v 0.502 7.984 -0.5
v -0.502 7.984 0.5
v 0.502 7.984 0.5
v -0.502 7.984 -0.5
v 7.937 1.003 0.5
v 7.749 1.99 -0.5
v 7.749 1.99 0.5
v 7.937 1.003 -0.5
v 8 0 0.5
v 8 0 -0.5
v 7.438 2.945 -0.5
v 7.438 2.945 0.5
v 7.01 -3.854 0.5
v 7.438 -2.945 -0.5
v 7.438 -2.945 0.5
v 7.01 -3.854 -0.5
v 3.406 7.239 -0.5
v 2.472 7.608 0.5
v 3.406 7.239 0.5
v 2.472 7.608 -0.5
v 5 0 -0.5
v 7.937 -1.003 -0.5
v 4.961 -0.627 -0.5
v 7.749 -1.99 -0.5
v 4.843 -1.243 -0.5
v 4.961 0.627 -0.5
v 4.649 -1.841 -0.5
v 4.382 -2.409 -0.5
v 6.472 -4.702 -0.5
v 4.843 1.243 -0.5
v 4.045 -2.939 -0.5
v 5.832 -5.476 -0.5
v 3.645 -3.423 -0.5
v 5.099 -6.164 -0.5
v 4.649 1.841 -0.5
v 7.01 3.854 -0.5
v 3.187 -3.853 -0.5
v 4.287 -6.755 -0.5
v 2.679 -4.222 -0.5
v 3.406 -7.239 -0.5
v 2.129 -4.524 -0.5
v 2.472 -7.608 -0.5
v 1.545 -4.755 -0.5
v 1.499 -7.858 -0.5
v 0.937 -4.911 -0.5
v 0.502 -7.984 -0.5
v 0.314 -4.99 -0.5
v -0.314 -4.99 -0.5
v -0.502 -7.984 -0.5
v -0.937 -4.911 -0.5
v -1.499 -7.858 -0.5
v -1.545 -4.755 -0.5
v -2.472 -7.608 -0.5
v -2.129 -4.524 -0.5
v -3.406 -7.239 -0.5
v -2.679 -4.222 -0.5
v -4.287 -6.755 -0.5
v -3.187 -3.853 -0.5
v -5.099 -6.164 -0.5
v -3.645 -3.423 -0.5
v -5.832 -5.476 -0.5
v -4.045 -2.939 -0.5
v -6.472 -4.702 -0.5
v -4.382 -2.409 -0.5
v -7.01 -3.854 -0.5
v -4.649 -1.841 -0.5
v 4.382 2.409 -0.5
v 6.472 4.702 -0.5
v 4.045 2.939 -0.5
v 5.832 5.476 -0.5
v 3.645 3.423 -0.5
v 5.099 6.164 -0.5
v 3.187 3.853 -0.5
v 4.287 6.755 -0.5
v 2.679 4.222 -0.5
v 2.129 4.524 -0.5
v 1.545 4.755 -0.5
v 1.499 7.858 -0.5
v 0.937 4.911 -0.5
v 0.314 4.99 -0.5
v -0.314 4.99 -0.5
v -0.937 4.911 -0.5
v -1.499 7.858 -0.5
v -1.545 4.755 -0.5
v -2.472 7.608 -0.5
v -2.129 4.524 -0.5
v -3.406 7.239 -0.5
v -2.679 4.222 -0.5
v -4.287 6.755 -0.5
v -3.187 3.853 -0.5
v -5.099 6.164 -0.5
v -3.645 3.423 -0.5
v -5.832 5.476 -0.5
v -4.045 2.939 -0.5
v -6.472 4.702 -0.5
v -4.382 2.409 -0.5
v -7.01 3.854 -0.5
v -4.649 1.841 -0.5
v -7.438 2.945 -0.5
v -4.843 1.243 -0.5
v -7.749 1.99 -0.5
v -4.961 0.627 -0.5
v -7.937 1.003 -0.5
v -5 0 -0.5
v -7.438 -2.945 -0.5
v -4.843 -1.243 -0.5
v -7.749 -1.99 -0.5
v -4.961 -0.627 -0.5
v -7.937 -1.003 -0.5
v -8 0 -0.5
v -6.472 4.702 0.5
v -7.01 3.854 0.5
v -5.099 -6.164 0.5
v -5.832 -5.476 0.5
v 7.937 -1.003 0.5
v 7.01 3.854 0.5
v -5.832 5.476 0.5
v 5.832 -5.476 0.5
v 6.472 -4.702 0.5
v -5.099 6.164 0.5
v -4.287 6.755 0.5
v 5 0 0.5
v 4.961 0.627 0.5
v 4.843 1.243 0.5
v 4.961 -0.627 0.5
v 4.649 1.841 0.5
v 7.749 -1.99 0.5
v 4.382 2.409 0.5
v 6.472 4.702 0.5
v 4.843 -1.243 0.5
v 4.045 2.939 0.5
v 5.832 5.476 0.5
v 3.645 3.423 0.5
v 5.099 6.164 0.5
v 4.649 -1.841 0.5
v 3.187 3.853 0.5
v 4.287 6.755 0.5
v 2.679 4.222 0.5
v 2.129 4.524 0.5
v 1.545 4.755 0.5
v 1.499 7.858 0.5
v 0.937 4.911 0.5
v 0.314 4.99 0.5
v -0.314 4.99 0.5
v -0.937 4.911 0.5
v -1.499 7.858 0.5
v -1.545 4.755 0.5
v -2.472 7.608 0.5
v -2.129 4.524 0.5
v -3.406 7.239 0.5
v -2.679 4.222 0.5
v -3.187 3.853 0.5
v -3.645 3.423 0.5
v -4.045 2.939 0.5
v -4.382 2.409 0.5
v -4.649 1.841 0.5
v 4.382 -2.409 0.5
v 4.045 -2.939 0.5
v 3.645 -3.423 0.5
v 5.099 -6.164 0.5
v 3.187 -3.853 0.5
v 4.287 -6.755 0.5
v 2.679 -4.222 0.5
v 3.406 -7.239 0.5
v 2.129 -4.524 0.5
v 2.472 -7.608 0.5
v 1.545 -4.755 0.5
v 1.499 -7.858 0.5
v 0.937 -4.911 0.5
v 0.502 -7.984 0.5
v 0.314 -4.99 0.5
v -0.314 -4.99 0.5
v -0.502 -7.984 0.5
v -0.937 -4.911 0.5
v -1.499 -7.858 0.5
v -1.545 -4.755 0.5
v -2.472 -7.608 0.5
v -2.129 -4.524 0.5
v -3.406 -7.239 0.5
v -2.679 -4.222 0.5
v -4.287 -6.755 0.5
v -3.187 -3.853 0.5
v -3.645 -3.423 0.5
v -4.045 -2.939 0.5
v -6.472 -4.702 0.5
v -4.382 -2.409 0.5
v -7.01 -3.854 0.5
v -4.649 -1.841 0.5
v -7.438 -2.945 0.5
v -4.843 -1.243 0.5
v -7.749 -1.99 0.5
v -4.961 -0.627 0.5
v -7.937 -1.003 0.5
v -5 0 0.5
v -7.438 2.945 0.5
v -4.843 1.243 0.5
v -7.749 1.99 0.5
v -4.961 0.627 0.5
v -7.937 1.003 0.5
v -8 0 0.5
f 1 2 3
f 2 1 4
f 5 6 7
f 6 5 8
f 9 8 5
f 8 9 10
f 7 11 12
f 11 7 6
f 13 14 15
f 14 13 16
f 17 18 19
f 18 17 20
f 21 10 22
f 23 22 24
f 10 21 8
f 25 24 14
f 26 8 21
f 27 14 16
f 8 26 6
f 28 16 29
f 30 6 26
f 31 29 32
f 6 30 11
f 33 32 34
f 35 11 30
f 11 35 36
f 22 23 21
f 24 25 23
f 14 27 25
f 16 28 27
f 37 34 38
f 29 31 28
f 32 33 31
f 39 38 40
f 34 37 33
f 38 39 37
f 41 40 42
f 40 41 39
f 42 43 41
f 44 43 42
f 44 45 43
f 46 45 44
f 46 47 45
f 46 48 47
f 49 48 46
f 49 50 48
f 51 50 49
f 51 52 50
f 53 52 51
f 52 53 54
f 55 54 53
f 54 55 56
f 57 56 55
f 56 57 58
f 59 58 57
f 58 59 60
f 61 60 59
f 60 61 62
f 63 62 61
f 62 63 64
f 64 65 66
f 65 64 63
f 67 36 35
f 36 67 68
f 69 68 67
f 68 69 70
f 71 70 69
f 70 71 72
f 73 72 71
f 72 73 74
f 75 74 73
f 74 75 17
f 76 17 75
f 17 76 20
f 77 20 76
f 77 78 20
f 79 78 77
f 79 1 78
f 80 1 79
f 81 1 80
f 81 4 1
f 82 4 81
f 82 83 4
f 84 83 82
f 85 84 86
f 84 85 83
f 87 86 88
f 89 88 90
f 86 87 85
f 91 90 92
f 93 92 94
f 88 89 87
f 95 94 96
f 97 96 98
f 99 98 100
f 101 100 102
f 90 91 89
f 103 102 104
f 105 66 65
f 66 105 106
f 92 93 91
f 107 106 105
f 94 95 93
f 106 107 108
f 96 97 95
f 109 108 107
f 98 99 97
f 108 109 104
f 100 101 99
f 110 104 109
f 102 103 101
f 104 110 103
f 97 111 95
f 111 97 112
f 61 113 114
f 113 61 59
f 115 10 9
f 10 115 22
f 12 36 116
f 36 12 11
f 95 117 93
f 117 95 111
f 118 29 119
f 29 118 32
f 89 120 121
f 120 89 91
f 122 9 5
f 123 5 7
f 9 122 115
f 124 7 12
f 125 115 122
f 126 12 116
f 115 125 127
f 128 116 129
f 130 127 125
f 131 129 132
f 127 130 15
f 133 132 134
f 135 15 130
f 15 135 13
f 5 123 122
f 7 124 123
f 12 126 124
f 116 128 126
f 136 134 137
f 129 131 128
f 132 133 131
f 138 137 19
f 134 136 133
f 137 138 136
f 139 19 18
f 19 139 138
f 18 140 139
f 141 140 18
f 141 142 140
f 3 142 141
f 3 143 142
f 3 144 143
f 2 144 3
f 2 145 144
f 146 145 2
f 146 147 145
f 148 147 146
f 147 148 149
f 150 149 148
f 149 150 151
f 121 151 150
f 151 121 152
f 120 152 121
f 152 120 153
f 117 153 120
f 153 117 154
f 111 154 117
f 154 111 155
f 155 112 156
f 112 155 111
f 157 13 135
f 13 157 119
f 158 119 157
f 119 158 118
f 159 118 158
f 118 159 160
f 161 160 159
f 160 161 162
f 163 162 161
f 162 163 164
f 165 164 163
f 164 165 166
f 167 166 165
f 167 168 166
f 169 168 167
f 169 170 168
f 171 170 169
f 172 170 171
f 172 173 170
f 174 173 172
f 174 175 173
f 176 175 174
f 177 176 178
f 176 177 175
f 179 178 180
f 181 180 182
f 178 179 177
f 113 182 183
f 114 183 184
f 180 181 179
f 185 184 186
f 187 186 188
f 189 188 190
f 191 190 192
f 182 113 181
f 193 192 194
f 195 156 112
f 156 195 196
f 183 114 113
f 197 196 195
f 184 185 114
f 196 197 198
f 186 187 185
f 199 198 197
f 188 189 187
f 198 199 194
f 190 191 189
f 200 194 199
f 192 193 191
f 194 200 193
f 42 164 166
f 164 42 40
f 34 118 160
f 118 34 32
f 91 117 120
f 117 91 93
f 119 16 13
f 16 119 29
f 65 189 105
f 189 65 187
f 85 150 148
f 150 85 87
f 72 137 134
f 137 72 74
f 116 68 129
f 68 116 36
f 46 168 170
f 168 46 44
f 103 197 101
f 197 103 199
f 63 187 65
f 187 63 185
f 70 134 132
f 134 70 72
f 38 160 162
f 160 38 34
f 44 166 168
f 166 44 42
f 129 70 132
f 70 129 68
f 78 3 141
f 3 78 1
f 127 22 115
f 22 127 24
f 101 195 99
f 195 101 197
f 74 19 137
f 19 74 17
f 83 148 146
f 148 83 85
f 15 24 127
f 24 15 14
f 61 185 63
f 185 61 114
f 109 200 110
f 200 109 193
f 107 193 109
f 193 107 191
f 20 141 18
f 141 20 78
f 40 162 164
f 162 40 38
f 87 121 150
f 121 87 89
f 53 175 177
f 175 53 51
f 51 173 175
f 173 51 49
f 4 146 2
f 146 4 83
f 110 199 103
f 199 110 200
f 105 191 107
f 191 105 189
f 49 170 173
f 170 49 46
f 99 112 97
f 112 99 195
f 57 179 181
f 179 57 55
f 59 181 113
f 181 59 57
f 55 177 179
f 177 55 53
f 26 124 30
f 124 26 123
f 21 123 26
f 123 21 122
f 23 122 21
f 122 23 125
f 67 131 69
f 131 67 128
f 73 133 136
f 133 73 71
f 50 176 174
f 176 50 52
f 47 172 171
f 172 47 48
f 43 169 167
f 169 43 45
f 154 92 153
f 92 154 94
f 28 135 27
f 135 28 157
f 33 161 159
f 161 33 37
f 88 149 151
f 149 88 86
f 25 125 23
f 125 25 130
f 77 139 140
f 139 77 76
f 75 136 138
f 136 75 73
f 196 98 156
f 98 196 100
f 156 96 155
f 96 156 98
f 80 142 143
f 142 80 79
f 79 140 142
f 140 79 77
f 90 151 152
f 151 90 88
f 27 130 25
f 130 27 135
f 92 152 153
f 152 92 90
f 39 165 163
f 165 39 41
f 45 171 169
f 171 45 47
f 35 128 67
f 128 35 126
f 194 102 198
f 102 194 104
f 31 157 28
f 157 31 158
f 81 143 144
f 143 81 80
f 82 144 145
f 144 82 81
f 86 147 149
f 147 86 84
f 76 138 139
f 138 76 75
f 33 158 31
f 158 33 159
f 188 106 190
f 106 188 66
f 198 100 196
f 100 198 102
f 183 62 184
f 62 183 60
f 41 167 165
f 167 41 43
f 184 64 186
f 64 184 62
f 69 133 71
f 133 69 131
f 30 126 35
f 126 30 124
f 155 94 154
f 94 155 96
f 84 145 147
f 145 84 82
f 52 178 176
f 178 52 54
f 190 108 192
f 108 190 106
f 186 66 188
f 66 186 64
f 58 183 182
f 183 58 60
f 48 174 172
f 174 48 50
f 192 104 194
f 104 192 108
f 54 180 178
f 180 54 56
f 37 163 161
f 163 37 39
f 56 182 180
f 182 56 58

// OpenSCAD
$fn = 50;


difference() {
	union() {
		translate(v = [0, 0, -0.5000000000]) {
			cylinder(h = 1, r = 8.0000000000);
		}
	}
	union() {
		translate(v = [0, 0, -100.0000000000]) {
			cylinder(h = 200, r = 5.0000000000);
		}
	}
}
